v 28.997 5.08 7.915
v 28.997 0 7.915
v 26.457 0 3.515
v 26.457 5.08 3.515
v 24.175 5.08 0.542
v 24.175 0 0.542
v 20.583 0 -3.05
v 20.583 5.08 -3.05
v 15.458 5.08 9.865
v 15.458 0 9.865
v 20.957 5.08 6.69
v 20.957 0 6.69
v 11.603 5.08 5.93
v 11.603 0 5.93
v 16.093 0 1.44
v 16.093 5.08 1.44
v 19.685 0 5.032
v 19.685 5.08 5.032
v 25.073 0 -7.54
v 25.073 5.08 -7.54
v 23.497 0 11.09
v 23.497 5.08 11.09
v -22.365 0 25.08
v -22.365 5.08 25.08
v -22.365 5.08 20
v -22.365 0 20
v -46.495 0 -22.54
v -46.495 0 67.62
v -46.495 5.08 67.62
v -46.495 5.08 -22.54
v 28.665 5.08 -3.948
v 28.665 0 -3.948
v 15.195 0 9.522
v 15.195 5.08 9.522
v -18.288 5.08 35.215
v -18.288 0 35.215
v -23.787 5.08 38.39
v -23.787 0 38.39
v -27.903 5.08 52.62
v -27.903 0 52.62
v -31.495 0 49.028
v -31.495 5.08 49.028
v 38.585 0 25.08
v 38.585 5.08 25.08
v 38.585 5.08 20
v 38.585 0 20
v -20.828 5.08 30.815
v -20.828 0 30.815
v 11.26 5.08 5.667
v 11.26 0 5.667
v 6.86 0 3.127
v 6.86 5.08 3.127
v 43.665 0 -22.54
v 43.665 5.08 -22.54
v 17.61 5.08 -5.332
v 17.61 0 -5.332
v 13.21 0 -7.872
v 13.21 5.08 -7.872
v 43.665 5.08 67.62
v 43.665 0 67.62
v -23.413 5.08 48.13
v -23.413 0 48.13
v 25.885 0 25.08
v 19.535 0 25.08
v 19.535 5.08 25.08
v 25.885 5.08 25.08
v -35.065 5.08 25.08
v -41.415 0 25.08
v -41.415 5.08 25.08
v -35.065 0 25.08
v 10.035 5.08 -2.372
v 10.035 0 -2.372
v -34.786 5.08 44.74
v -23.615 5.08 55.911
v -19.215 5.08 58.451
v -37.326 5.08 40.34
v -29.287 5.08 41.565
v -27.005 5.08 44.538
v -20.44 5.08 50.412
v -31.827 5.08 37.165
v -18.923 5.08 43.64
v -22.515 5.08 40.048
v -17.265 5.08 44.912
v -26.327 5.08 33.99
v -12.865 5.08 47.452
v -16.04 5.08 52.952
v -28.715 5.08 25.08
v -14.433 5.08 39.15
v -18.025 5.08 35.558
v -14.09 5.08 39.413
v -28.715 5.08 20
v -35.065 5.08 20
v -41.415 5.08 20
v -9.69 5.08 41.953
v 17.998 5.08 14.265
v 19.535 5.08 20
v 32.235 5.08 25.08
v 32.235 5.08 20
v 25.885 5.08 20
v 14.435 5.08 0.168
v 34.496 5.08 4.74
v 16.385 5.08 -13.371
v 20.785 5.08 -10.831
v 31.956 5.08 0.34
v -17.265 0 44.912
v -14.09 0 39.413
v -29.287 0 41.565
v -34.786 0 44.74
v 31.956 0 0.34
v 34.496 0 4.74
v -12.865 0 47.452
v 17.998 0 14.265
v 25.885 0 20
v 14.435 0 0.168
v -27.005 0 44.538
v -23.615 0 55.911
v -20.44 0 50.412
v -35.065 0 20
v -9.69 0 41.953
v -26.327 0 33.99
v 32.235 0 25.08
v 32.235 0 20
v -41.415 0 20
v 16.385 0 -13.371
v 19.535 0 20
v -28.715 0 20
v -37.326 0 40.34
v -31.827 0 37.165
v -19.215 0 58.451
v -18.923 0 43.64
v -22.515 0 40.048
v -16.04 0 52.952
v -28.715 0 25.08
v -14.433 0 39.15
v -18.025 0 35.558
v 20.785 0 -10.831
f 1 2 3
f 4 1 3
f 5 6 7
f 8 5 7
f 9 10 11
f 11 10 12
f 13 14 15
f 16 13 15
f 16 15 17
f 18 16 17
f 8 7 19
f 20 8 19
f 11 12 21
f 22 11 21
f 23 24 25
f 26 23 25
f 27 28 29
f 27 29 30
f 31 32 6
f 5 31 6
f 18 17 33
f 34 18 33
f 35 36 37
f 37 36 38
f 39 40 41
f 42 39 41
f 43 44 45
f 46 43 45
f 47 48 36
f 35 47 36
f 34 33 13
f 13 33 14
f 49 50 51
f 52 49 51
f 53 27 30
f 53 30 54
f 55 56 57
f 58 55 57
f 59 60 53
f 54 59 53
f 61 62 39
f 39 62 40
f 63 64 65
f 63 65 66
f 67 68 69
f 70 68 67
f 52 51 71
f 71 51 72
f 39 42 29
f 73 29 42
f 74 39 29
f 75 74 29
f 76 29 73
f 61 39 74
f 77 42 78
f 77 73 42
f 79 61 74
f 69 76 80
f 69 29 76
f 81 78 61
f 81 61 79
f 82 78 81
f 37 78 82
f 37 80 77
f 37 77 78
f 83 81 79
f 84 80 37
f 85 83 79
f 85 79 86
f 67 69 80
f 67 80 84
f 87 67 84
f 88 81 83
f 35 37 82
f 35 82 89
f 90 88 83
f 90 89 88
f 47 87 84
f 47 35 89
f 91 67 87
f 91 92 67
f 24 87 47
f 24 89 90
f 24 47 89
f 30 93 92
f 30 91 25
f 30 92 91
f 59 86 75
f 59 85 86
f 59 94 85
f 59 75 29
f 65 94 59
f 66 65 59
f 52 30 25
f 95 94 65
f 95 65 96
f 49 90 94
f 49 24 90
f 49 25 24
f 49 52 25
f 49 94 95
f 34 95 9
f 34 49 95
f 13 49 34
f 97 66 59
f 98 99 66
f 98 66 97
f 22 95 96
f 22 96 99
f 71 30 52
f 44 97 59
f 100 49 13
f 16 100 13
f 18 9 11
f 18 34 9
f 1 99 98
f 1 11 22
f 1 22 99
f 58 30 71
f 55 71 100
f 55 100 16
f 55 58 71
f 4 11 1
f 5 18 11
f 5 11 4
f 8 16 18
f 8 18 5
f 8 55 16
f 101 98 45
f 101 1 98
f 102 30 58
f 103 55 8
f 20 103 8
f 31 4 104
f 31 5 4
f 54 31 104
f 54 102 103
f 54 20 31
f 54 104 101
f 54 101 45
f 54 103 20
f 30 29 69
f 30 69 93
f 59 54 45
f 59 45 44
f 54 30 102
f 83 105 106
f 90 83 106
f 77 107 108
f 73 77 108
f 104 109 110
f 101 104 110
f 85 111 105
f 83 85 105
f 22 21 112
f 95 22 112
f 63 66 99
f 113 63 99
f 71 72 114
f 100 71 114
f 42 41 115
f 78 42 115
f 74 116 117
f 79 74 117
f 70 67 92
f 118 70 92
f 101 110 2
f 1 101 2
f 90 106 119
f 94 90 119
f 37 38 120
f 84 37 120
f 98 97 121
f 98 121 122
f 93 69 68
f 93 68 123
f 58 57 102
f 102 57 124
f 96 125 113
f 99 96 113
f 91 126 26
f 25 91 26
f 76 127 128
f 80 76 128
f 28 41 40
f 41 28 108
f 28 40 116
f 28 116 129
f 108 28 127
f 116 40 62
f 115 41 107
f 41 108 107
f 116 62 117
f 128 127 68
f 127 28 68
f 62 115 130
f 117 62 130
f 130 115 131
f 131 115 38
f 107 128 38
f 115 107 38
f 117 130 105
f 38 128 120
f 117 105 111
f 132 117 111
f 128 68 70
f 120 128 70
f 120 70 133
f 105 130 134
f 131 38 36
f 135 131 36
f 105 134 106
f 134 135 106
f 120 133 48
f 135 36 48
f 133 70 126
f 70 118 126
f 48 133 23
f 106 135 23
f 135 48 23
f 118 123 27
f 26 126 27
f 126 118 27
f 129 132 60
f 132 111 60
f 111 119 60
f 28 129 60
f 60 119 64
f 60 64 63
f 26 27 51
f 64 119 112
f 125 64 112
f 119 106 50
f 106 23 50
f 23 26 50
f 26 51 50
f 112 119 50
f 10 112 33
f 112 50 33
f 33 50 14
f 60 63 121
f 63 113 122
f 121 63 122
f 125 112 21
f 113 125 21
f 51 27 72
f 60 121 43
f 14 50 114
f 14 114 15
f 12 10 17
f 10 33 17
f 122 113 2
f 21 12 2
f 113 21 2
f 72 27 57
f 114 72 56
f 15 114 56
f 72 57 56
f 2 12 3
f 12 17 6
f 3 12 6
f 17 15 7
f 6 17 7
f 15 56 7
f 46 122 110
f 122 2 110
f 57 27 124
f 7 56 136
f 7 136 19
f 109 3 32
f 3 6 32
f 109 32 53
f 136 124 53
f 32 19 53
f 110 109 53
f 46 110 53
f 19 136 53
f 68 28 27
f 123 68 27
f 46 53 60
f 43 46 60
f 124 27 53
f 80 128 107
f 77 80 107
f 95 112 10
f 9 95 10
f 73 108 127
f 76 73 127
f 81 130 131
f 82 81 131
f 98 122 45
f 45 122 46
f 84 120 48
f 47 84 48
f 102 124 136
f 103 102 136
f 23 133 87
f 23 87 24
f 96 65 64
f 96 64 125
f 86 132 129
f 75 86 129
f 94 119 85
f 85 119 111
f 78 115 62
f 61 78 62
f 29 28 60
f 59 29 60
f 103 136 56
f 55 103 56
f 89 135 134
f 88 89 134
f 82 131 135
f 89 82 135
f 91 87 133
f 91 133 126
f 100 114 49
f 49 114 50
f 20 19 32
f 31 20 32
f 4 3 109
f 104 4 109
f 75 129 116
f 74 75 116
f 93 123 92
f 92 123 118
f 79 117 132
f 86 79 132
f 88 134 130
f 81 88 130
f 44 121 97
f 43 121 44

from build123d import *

# Parameters (mm, degrees)
SKETCH1_W           = 90.15984
SKETCH1_H           = 90.15984
SKETCH1_W_2         = 6.35
SKETCH1_H_2         = 5.08
BOSS_EXTRUDE1_DEPTH = 5.08


with BuildPart() as part:
    # Sketch1 → Boss-Extrude1 (new body)
    with BuildSketch(Plane(origin=(0, 0, 0), x_dir=(1, 0, 0), z_dir=(0, 1, 0))):
        with Locations((-1.415064753, -22.53996)):
            Rectangle(SKETCH1_W, SKETCH1_H)
        with Locations((-38.239984753, -22.53996)):
            Rectangle(SKETCH1_W_2, SKETCH1_H_2, mode=Mode.SUBTRACT)
        with Locations((-25.539984753, -22.53996)):
            Rectangle(SKETCH1_W_2, SKETCH1_H_2, mode=Mode.SUBTRACT)
        Polygon((20.784599772, 10.830986869), (17.609599772, 5.331725555), (13.210190721, 7.871725555), (16.385190721, 13.370986869), align=None, mode=Mode.SUBTRACT)
        Polygon((14.434599772, -0.167535759), (11.259599772, -5.666797073), (6.860190721, -3.126797073), (10.035190721, 2.372464241), align=None, mode=Mode.SUBTRACT)
        Polygon((28.66520115, 3.948203455), (24.175073089, -0.541924606), (20.582970641, 3.050177843), (25.073098701, 7.540305903), align=None, mode=Mode.SUBTRACT)
        Polygon((19.684945029, -5.032052666), (15.194816968, -9.522180727), (11.60271452, -5.930078278), (16.09284258, -1.439950218), align=None, mode=Mode.SUBTRACT)
        Polygon((34.495882116, -4.739704526), (28.996620802, -7.914704526), (26.456620802, -3.515295474), (31.955882116, -0.340295474), align=None, mode=Mode.SUBTRACT)
        Polygon((23.497359488, -11.089704526), (17.998098174, -14.264704526), (15.458098174, -9.865295474), (20.957359488, -6.690295474), align=None, mode=Mode.SUBTRACT)
        with Locations((35.409855247, -22.53996)):
            Rectangle(SKETCH1_W_2, SKETCH1_H_2, mode=Mode.SUBTRACT)
        with Locations((22.709855247, -22.53996)):
            Rectangle(SKETCH1_W_2, SKETCH1_H_2, mode=Mode.SUBTRACT)
        Polygon((-23.614729279, -55.910906869), (-20.439729279, -50.411645555), (-16.040320228, -52.951645555), (-19.215320228, -58.450906869), align=None, mode=Mode.SUBTRACT)
        Polygon((-17.264729279, -44.912384241), (-14.089729279, -39.413122927), (-9.690320228, -41.953122927), (-12.865320228, -47.452384241), align=None, mode=Mode.SUBTRACT)
        Polygon((-31.495330656, -49.028123455), (-27.005202596, -44.537995394), (-23.413100148, -48.130097843), (-27.903228208, -52.620225903), align=None, mode=Mode.SUBTRACT)
        Polygon((-22.515074535, -40.047867334), (-18.024946475, -35.557739273), (-14.432844026, -39.149841722), (-18.922972087, -43.639969782), align=None, mode=Mode.SUBTRACT)
        Polygon((-37.326011623, -40.340215474), (-31.826750309, -37.165215474), (-29.286750309, -41.564624526), (-34.786011623, -44.739624526), align=None, mode=Mode.SUBTRACT)
        Polygon((-26.327488995, -33.990215474), (-20.828227681, -30.815215474), (-18.288227681, -35.214624526), (-23.787488995, -38.389624526), align=None, mode=Mode.SUBTRACT)
    extrude(amount=BOSS_EXTRUDE1_DEPTH)


solid = part.part
